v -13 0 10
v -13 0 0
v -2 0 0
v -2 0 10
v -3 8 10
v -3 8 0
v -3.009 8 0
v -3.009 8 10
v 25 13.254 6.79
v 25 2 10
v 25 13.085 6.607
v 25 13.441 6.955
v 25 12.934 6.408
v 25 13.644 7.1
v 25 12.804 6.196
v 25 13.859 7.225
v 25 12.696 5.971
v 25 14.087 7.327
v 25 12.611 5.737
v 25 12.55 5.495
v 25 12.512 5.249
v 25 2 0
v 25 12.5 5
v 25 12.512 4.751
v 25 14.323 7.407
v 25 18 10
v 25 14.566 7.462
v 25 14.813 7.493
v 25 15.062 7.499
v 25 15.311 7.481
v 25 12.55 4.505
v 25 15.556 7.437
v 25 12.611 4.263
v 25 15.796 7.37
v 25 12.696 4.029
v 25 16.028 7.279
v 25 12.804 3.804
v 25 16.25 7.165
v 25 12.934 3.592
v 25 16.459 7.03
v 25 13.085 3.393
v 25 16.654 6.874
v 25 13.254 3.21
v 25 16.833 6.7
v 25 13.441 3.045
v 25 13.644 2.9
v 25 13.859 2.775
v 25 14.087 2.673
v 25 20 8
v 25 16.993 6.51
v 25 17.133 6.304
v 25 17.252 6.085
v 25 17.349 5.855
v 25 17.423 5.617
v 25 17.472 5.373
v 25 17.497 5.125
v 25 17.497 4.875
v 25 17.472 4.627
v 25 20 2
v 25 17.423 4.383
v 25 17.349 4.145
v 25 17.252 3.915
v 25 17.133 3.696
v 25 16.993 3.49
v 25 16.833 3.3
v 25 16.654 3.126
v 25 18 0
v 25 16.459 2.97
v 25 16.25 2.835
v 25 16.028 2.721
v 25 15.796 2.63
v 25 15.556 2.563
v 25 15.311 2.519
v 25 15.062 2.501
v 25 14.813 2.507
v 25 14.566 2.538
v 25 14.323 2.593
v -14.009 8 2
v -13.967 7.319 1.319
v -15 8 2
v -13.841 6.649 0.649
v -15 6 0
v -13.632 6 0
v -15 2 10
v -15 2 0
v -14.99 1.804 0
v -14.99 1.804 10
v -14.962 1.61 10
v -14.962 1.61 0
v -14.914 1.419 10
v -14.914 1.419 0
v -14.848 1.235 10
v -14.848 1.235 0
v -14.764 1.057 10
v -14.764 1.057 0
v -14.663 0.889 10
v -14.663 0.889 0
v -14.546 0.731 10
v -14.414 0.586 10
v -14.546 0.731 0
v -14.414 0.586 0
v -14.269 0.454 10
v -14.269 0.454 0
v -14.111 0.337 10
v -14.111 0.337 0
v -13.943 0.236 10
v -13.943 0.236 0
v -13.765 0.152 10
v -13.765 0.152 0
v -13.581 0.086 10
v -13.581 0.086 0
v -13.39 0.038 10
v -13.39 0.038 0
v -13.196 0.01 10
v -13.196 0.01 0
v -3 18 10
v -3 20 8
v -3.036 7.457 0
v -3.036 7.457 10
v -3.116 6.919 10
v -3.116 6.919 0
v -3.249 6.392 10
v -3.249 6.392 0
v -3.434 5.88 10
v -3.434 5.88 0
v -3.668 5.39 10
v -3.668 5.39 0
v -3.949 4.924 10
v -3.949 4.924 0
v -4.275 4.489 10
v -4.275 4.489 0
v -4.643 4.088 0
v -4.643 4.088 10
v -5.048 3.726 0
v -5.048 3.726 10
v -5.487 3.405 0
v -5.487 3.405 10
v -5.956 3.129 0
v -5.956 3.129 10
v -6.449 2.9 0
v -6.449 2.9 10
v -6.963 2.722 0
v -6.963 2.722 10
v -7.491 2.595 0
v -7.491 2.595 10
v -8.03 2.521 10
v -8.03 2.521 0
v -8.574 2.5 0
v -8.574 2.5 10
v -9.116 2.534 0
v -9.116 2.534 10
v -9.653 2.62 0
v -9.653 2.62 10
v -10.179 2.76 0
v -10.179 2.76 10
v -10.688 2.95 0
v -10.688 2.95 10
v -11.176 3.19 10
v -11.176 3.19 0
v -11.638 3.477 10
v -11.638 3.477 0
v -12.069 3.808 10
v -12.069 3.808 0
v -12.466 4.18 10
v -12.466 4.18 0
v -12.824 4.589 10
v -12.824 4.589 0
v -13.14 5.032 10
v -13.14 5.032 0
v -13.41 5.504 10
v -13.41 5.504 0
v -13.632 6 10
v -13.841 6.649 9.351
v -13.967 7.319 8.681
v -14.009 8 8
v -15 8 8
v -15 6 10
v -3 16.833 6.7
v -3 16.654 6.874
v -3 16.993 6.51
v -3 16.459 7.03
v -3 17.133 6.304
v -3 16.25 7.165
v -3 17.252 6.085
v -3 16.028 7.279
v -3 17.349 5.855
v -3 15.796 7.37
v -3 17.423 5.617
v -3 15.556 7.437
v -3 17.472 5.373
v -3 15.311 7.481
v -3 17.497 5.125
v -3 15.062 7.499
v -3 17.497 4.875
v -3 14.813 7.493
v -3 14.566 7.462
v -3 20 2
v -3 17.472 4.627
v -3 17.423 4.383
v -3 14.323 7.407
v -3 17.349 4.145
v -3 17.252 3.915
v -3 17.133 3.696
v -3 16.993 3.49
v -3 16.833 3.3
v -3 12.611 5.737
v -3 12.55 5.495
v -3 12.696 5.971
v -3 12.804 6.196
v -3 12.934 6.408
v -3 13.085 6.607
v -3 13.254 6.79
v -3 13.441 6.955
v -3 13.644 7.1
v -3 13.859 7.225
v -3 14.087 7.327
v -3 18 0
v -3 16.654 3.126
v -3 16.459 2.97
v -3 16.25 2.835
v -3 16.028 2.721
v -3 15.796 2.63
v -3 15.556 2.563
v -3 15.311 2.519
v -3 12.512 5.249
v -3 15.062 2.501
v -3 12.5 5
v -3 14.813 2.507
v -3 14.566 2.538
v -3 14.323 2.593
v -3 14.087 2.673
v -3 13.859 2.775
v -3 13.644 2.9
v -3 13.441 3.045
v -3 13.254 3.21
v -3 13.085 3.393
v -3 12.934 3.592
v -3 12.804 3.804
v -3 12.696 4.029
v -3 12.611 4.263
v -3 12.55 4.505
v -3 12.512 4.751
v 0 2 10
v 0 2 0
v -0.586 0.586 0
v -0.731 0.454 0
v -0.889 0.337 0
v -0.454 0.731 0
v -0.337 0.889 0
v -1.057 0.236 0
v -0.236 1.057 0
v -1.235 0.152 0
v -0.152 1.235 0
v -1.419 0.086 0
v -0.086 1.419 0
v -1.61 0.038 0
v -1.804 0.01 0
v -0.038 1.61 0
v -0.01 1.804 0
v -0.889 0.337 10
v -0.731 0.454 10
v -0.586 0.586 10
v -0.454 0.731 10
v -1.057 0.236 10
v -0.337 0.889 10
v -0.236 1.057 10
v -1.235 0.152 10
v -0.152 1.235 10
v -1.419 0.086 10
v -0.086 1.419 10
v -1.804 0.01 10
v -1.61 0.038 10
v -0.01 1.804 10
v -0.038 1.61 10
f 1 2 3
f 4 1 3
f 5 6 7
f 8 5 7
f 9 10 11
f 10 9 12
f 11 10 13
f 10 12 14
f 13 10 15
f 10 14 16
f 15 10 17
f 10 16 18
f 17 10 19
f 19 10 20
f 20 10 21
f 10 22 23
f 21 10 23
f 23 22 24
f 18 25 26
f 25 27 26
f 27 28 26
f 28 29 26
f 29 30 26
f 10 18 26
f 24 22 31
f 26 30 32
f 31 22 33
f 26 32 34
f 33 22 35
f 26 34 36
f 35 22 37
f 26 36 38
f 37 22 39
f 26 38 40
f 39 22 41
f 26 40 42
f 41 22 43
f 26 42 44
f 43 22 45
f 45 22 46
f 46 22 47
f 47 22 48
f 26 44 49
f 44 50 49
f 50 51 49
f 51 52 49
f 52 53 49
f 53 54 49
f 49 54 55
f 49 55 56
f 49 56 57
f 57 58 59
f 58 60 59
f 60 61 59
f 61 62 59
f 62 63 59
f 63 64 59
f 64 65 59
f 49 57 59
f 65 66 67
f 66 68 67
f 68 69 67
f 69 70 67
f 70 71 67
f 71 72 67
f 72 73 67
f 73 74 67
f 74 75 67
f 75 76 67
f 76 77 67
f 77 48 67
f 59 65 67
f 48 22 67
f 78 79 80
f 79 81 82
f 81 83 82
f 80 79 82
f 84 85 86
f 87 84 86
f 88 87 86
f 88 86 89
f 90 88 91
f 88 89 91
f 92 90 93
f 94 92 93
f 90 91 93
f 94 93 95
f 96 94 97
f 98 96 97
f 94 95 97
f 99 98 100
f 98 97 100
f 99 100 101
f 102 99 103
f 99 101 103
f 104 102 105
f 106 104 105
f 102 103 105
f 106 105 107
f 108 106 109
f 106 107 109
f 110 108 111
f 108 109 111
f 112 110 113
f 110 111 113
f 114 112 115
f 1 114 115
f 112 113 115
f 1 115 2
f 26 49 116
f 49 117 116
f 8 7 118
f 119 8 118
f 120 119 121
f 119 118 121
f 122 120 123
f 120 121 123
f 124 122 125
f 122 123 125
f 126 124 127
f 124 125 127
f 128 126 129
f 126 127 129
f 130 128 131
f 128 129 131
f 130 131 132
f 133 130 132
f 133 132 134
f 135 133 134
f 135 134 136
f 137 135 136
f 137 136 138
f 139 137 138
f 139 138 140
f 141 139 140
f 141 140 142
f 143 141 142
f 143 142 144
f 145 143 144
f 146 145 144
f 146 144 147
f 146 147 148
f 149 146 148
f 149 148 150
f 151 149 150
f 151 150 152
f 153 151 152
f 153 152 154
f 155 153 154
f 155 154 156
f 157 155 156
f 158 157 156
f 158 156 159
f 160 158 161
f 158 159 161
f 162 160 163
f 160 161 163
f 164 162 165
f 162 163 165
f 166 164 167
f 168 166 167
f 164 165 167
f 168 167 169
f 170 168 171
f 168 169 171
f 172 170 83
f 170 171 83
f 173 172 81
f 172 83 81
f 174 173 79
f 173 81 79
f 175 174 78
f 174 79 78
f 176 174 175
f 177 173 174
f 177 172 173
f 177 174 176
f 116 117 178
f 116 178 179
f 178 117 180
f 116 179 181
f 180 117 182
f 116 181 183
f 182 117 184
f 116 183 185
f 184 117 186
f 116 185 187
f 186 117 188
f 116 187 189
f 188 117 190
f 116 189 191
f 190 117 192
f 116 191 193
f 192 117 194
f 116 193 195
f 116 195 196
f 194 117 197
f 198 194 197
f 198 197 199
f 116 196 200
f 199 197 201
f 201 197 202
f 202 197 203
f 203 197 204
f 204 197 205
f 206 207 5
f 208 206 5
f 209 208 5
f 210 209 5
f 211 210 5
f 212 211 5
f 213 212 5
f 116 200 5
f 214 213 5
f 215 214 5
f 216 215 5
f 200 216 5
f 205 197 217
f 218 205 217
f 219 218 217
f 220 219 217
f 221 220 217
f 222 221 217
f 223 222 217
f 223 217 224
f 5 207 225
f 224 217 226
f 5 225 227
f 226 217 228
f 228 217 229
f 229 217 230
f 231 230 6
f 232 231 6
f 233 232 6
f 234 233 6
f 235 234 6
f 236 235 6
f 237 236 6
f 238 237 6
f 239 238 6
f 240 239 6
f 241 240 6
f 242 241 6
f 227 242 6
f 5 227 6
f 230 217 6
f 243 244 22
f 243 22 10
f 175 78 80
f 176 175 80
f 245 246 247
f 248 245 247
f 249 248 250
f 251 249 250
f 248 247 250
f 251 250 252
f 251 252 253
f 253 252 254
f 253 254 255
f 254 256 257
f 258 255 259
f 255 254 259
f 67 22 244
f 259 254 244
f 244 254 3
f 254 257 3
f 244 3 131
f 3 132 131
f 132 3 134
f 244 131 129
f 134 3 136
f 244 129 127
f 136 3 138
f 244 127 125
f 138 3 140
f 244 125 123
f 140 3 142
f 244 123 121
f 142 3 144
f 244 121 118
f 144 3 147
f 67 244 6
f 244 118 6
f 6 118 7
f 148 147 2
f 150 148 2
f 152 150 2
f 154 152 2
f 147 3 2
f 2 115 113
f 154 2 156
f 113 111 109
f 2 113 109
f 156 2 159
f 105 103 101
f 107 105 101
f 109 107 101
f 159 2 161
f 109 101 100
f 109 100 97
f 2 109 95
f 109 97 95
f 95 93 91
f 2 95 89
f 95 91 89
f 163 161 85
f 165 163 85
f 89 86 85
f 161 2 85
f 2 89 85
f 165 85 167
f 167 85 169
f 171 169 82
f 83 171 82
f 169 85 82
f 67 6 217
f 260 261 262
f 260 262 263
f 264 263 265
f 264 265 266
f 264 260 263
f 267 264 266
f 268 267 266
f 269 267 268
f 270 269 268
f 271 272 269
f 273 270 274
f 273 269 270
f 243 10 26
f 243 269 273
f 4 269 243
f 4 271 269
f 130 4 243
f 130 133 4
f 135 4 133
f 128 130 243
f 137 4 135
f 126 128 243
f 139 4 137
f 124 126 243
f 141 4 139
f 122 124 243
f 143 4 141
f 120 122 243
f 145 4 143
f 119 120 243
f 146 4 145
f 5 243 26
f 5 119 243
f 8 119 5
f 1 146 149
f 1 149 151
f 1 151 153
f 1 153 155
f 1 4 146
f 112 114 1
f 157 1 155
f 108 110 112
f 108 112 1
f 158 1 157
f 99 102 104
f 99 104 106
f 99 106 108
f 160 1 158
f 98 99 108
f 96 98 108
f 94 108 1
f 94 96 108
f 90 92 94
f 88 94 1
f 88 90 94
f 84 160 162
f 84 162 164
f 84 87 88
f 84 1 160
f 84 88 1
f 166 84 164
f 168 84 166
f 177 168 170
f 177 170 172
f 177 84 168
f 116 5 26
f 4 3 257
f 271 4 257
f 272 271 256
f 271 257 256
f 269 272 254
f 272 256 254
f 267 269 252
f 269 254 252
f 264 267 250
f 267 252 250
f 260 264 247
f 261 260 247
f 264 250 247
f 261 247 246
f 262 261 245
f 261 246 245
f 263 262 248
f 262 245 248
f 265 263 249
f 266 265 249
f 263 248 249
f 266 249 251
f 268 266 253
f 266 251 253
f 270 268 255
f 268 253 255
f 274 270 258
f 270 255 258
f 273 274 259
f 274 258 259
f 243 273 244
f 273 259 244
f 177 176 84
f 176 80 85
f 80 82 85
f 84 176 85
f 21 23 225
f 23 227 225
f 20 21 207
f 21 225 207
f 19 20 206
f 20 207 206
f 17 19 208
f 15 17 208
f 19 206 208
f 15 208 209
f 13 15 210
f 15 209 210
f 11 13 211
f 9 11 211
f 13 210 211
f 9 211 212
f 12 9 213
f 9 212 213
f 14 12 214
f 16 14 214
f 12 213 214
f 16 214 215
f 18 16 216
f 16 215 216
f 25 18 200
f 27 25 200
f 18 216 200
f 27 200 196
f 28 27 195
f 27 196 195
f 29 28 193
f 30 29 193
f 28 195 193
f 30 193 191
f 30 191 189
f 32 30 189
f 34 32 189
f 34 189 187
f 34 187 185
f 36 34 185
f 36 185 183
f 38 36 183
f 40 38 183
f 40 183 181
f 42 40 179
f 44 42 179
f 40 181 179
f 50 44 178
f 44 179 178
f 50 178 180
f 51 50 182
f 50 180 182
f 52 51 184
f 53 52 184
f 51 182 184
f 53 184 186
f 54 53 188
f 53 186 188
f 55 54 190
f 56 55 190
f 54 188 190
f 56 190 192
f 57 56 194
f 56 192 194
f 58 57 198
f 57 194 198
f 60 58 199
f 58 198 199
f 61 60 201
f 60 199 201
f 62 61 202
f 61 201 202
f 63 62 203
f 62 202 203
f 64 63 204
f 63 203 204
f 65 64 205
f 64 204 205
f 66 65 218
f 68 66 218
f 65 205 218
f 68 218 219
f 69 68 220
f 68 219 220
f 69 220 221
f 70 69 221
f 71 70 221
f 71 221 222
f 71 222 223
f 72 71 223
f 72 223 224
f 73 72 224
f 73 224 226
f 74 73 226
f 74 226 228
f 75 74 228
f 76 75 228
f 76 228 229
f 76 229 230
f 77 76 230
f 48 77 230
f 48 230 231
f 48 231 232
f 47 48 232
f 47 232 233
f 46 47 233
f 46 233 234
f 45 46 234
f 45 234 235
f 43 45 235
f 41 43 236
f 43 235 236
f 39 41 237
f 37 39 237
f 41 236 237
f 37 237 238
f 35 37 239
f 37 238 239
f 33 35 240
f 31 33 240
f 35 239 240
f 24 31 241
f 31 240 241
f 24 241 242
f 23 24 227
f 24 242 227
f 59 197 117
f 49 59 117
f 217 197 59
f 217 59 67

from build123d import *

# Parameters (mm, degrees)
F1_DEPTH = 10
F2_SIZE  = 2
F3_R     = 2.5
F4_DEPTH = 25
F5_DEPTH = 25


with BuildPart() as f1:
    # F0 (on Top) → F1 (new body)
    with BuildSketch(Plane.XY):
        with BuildLine():
            ThreePointArc((-2, 0), (-0.5857864376, 0.5857864376), (0, 2))
            Line((0, 2), (0, 20))
            Line((0, 20), (-3, 20))
            Line((-3, 20), (-3, 8))
            Line((-3, 8), (-3.0090067523, 8))
            ThreePointArc((-3.0090067523, 8), (-8.5090067523, 2.5), (-14.0090067523, 8))
            Line((-14.0090067523, 8), (-15, 8))
            Line((-15, 8), (-15, 2))
            ThreePointArc((-15, 2), (-14.4142135624, 0.5857864376), (-13, 0))
            Line((-13, 0), (-2, 0))
        make_face()
    extrude(amount=F1_DEPTH)

    # F2
    f2_edges = [f1.edges().sort_by_distance(p)[0] for p in [
        (-14.504503, 8, 10),
        (-14.504503, 8, 0),
        (-1.5, 20, 10),
        (-1.5, 20, 0),
    ]]
    chamfer(f2_edges, length=F2_SIZE)

    # F3 (on face) → F4 (cut)
    with BuildSketch(Plane(origin=(-3, 0, 0), x_dir=(0, -1, 0), z_dir=(-1, 0, 0))):
        with Locations((-15, 5)):
            Circle(F3_R)
    extrude(amount=-F4_DEPTH, mode=Mode.SUBTRACT)

    # F5 (add): a face of the model
    f5_faces = [f1.faces().sort_by_distance(p)[0] for p in [
        (0, 10.2845386319, 5),
    ]]
    extrude(f5_faces, amount=F5_DEPTH)


solid = f1.part
